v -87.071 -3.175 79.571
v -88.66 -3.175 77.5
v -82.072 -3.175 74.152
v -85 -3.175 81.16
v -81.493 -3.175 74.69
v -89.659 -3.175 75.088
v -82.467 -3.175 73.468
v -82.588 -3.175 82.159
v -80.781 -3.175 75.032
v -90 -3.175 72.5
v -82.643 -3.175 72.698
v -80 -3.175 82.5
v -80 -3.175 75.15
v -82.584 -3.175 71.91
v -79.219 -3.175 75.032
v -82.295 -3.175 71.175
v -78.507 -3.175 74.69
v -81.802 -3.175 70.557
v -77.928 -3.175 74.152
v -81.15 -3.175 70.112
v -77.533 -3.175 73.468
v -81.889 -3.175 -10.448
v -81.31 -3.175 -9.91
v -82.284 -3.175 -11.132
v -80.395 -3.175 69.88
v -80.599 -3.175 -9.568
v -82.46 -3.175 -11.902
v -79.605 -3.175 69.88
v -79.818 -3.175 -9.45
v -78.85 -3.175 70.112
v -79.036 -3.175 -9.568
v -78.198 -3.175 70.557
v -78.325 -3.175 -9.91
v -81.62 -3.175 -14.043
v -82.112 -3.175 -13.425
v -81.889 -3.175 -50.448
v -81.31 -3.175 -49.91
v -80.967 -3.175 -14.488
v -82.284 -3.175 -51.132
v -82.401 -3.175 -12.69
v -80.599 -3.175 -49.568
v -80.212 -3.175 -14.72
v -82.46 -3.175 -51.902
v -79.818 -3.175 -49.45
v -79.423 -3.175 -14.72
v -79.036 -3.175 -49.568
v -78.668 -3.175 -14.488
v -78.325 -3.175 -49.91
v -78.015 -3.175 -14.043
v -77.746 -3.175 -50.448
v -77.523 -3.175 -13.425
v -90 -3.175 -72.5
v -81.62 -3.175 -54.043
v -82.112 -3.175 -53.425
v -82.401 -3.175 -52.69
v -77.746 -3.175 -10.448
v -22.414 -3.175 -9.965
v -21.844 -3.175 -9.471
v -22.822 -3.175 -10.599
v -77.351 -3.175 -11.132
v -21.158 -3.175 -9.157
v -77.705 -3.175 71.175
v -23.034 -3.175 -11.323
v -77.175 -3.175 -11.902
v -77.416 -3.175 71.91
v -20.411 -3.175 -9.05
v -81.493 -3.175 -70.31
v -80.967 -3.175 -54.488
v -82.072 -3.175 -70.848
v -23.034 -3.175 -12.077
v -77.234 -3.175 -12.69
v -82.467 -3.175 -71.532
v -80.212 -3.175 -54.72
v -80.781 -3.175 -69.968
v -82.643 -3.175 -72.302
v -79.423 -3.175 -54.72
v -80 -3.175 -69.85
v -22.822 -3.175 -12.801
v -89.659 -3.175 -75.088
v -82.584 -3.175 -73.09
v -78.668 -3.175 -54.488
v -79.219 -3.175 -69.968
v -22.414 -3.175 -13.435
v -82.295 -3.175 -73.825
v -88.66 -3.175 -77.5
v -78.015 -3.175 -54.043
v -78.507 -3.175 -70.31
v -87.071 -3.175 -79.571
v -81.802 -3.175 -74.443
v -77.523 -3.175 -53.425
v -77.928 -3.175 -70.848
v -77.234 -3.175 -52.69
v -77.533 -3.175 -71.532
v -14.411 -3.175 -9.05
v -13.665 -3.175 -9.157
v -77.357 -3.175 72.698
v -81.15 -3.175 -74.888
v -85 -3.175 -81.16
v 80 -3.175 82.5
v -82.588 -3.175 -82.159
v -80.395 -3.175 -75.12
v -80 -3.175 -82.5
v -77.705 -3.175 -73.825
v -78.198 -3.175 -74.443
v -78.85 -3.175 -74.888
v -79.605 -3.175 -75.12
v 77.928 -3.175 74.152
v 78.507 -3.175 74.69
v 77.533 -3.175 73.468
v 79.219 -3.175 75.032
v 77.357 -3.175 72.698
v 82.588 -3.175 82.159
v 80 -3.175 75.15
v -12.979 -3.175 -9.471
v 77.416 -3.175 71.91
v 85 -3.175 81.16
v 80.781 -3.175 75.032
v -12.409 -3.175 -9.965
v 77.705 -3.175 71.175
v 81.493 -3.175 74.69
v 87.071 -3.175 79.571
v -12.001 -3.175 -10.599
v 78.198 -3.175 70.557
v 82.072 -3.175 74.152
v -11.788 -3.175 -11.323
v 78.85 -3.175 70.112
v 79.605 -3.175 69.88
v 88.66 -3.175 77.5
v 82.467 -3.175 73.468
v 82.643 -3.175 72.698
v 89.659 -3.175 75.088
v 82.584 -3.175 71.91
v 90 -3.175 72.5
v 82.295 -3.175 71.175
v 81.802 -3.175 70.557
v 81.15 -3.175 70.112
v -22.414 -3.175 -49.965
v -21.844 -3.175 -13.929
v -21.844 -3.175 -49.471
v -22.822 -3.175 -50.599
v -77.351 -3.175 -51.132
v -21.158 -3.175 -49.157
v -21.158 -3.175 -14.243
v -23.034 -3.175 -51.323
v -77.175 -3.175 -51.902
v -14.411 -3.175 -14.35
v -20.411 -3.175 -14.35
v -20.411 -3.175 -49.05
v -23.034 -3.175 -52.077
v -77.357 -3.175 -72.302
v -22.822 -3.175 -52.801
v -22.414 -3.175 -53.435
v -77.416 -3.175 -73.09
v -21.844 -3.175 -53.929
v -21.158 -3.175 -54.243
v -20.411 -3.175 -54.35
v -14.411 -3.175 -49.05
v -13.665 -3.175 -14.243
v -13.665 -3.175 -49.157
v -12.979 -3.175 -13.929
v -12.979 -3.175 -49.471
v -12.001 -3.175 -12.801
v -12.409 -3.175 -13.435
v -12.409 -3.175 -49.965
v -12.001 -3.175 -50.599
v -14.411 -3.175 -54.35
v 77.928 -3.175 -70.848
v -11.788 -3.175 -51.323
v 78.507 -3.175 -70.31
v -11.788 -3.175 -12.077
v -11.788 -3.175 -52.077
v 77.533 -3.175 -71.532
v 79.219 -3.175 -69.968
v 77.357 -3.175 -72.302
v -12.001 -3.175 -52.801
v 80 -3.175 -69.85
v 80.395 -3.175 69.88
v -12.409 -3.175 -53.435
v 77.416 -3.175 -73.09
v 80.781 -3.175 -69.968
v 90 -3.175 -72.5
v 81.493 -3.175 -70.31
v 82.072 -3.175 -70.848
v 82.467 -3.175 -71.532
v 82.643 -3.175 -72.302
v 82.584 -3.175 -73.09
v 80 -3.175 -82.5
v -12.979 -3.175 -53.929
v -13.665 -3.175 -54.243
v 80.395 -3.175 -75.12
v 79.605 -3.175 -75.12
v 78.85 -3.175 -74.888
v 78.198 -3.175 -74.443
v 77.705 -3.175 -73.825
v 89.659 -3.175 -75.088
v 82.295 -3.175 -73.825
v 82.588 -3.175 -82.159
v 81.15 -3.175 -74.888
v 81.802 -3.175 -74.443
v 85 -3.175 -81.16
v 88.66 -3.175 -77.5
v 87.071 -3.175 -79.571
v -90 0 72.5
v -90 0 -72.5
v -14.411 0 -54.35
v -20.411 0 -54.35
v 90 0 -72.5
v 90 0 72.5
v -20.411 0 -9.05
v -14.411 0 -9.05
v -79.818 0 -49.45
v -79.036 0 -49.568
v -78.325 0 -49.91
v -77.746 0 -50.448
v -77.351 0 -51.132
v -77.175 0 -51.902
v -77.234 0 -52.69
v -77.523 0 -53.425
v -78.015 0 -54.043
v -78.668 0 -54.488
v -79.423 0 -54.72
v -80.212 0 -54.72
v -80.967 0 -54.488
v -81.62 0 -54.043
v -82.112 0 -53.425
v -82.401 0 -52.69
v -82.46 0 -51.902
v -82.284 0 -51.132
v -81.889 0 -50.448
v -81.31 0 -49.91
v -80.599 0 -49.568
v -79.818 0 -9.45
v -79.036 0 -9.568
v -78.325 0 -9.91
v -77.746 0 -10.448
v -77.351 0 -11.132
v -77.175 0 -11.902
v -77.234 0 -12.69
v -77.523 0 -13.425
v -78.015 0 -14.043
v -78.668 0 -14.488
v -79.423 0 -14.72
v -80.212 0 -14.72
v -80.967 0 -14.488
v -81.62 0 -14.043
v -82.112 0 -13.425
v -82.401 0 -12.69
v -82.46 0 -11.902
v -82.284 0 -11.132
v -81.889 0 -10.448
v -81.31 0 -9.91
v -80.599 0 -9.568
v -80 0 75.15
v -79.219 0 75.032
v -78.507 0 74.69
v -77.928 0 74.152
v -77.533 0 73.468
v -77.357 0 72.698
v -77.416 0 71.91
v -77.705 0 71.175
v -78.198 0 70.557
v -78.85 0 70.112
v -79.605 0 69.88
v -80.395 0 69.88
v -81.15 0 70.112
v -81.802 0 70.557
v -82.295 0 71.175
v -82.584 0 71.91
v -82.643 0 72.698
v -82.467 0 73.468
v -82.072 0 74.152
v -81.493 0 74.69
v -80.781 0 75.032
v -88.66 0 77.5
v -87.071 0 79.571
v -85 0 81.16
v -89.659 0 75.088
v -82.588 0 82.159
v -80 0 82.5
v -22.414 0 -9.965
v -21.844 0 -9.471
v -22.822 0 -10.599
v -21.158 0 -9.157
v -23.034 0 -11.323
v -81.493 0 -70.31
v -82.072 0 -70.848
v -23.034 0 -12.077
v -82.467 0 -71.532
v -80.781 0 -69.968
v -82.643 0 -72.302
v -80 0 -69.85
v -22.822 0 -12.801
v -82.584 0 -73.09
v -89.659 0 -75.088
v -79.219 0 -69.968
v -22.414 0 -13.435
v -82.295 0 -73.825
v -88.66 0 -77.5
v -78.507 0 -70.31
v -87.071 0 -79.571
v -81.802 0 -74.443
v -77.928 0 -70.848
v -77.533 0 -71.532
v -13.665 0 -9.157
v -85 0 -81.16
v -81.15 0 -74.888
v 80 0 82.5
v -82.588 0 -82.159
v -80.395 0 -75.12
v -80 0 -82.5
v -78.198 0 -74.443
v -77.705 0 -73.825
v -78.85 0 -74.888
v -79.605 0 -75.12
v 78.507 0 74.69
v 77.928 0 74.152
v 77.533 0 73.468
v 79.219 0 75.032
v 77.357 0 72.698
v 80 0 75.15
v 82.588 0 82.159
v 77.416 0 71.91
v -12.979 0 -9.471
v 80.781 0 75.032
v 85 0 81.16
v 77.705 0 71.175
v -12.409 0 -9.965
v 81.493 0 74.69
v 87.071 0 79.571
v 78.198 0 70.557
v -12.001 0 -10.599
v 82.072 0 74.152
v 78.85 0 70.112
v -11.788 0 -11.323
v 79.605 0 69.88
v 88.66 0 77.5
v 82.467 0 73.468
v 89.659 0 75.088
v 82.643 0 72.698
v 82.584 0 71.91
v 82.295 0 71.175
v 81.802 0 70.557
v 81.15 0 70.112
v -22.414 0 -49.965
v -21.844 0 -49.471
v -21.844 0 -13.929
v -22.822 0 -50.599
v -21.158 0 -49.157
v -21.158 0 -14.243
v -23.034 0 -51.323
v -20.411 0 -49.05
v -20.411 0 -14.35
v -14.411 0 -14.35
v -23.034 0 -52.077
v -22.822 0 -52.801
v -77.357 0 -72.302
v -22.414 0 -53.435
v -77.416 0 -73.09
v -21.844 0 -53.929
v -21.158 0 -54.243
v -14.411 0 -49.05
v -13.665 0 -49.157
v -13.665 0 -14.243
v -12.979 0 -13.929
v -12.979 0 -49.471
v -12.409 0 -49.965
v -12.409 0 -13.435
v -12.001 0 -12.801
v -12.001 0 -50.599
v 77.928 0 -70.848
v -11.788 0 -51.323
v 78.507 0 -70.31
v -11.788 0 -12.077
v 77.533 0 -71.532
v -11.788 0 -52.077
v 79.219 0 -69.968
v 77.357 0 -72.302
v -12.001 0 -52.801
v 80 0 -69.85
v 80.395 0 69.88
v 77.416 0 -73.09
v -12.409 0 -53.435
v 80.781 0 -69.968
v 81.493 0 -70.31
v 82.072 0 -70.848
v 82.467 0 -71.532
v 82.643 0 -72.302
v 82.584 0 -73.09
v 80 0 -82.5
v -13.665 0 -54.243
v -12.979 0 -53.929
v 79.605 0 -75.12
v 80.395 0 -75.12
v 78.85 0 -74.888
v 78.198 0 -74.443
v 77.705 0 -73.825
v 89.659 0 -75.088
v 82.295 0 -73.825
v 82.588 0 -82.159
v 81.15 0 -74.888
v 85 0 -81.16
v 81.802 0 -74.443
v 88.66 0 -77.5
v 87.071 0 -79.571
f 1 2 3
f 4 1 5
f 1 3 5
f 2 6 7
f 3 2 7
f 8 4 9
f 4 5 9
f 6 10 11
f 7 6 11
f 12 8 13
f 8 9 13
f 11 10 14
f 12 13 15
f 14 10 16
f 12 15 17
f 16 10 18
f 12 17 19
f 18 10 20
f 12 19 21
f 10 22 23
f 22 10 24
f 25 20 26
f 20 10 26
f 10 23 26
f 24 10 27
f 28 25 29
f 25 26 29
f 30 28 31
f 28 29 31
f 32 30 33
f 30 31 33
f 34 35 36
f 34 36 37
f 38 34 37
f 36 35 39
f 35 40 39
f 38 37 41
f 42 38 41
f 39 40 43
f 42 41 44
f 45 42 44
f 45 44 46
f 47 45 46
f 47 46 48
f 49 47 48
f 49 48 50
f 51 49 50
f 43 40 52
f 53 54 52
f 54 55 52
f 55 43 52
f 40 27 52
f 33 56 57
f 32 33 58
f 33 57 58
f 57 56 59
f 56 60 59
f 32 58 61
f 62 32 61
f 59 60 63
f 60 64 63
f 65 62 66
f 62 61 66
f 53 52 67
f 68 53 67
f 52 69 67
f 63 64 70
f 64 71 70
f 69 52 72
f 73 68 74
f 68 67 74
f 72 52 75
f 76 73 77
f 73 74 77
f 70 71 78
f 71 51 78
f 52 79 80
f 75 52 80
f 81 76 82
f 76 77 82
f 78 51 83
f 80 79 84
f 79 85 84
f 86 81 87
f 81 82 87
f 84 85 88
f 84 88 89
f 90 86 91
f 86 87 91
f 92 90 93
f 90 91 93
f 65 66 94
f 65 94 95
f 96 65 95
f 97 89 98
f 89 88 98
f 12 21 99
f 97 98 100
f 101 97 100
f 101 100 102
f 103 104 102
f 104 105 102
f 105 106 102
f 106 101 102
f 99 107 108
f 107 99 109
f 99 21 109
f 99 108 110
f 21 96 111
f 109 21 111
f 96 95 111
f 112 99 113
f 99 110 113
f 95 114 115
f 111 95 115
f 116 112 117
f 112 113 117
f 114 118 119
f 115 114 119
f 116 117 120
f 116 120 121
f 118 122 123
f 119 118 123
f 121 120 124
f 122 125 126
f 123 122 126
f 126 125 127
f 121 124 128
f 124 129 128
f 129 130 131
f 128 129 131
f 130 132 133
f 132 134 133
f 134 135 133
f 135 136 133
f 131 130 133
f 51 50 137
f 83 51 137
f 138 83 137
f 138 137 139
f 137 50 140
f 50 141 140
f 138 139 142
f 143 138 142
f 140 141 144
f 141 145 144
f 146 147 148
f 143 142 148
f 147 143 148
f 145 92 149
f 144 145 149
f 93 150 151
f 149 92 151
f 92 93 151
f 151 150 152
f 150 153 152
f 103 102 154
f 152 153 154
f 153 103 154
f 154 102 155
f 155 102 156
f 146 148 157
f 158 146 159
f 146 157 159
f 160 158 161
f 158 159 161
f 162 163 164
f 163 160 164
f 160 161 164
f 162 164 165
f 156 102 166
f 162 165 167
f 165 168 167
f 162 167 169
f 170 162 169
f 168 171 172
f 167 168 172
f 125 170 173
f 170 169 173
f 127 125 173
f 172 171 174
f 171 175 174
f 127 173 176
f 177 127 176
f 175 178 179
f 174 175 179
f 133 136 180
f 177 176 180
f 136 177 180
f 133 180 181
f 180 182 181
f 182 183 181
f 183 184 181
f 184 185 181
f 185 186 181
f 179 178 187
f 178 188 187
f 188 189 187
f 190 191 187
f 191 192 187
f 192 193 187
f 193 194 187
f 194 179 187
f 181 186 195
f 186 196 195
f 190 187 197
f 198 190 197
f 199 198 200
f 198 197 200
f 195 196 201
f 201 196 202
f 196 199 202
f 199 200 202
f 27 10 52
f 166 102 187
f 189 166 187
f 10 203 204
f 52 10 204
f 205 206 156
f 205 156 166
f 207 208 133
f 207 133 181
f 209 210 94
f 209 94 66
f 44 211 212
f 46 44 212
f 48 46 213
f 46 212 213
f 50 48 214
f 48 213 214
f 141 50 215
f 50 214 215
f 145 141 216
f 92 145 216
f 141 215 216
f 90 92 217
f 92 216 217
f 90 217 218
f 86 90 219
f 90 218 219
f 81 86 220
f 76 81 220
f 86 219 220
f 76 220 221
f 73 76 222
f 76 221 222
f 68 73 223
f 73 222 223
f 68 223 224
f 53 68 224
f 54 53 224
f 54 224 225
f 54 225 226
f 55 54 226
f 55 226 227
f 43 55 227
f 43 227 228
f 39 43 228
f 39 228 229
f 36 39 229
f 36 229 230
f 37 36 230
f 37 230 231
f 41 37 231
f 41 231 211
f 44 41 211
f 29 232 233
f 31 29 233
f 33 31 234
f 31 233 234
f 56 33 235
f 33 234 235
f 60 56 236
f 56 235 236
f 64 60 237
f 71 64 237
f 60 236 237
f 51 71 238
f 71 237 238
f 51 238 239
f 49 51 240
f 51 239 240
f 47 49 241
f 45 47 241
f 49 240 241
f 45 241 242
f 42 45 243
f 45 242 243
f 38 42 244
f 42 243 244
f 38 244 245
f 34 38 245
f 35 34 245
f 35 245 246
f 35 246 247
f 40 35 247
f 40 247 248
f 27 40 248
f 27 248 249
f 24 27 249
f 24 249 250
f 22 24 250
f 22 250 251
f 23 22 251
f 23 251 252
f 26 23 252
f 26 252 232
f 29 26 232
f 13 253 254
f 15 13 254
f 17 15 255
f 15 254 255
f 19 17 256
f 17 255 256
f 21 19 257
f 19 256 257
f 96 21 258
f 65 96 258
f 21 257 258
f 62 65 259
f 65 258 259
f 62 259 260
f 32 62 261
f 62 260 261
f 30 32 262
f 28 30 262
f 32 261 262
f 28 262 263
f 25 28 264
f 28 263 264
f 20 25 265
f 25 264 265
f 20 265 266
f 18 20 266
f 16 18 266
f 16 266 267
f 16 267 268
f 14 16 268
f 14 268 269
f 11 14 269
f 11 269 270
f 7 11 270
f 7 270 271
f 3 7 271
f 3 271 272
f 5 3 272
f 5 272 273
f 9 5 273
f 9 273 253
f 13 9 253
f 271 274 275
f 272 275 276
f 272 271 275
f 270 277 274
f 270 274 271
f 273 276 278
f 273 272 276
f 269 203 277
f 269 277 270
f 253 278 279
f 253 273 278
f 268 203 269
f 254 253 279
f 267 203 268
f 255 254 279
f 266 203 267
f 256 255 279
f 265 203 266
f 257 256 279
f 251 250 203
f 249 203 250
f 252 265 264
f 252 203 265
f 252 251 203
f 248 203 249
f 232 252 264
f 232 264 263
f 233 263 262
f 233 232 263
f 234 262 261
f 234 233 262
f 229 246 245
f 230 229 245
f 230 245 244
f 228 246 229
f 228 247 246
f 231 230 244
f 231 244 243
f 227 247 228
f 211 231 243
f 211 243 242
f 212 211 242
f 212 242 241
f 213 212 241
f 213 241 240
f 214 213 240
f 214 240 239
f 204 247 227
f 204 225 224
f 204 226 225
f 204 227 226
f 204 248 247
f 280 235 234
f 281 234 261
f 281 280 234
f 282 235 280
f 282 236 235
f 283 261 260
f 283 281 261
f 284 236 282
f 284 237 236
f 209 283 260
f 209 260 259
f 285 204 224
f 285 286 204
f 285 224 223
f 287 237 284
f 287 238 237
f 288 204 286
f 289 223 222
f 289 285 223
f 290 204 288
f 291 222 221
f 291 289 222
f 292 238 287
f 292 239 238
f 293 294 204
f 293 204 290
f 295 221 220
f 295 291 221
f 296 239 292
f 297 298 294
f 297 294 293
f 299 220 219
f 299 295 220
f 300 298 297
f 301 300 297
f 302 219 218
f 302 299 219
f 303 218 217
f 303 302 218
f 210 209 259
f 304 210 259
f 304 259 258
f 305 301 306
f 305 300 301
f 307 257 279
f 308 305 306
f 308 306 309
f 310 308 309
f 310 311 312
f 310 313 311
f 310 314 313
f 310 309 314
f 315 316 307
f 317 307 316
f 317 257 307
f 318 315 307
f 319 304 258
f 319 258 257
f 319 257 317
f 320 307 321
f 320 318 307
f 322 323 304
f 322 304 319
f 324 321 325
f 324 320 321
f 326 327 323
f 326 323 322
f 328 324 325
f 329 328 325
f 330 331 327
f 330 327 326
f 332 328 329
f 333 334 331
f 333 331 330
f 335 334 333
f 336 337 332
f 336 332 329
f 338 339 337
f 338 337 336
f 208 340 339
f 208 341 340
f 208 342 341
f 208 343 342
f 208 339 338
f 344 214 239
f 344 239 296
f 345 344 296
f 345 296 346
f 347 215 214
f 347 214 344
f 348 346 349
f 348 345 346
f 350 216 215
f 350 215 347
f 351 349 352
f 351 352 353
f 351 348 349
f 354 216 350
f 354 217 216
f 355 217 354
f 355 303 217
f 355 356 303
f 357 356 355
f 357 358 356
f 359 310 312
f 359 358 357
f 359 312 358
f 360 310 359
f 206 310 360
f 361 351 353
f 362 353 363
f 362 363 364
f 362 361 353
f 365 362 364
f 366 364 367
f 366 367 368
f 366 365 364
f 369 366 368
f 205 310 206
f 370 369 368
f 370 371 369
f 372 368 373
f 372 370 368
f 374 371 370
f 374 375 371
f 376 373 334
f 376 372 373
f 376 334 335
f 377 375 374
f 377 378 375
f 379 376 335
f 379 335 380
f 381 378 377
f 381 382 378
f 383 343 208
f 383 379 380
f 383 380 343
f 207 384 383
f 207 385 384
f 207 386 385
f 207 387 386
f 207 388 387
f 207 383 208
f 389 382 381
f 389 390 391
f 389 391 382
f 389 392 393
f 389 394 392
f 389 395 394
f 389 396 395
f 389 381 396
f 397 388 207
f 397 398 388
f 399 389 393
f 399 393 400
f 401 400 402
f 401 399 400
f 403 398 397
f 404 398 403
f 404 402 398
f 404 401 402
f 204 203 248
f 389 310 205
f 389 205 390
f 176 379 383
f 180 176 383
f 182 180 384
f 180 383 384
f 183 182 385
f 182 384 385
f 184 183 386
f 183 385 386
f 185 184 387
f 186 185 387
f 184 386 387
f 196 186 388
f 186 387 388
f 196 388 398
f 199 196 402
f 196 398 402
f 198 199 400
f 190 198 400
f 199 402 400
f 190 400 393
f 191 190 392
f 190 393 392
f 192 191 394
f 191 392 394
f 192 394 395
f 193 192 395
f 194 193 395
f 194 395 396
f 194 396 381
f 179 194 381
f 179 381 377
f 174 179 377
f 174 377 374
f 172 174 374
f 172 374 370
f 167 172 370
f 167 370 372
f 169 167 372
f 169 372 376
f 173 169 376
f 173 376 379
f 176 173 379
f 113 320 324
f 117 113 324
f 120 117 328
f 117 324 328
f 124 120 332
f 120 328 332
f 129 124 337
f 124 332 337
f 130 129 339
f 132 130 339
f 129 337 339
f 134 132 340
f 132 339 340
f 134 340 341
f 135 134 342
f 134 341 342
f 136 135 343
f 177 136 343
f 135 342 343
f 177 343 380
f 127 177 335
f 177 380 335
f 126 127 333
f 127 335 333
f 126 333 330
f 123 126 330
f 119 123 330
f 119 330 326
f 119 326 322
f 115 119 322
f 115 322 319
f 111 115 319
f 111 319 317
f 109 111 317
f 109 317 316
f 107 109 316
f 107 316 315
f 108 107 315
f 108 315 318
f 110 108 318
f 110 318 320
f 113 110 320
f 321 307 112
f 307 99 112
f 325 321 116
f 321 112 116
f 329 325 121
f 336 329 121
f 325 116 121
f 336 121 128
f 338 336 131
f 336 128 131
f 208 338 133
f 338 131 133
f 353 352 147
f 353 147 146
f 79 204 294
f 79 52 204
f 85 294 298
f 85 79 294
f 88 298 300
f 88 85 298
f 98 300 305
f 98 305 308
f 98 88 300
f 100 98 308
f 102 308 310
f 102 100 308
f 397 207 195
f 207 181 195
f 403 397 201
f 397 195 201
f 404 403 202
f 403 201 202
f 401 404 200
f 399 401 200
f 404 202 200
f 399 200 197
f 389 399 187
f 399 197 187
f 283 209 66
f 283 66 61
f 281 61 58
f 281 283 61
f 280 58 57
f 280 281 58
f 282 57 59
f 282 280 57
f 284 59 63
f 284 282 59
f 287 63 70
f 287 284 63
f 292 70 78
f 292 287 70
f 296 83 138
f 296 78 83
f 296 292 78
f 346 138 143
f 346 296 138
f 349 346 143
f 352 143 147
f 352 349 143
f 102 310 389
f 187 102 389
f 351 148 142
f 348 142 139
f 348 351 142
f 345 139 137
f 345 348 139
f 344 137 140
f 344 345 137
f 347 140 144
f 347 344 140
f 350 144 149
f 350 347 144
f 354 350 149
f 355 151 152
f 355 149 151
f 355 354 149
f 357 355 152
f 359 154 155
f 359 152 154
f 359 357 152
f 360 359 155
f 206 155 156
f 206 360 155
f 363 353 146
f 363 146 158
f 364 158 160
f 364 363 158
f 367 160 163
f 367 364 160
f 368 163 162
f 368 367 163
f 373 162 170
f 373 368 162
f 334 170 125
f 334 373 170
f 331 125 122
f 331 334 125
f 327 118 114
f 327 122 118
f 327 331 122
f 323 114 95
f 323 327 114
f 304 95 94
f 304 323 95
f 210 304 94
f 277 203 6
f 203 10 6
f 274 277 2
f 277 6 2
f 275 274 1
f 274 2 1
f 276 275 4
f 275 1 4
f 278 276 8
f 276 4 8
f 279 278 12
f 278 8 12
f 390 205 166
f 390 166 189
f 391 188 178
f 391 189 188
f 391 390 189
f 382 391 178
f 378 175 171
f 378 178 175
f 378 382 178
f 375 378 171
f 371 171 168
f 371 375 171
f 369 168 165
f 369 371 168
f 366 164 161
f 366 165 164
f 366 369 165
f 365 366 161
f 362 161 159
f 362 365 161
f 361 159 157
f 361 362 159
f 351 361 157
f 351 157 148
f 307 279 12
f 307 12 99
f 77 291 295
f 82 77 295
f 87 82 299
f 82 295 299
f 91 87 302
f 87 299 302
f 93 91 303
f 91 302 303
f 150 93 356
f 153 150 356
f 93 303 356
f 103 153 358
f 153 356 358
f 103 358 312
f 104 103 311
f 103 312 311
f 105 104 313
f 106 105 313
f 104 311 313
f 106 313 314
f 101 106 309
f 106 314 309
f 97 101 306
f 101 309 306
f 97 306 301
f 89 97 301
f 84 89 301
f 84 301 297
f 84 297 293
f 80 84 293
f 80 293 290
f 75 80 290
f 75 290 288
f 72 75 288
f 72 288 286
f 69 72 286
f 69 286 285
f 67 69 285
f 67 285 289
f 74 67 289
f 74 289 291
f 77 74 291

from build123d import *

# Parameters (mm, degrees)
SKETCH1_W          = 180
SKETCH1_H          = 165
BASE_FLANGE1_DEPTH = 3.175
FILLET1_R          = 10
SKETCH2_R          = 2.65
CUT_EXTRUDE1_DEPTH = 123.132430685
SKETCH3_R          = 2.65
CUT_EXTRUDE2_DEPTH = 123.132430685


# Sheet-metal steps are written as plain solids
with BuildPart() as part:
    # Sketch1 → Base-Flange1 (new body)
    with BuildSketch(Plane(origin=(0, 0, 0), x_dir=(1, 0, 0), z_dir=(0, 1, 0))):
        Rectangle(SKETCH1_W, SKETCH1_H)
    extrude(amount=-BASE_FLANGE1_DEPTH)

    # Fillet1
    fillet1_edges = [part.edges().sort_by_distance(p)[0] for p in [
        (90, -1.5875, 82.5),
        (-90, -1.5875, 82.5),
        (-90, -1.5875, -82.5),
        (90, -1.5875, -82.5),
    ]]
    fillet(fillet1_edges, radius=FILLET1_R)

    # Sketch2 → Cut-Extrude1 (cut, through all)
    with BuildSketch(Plane(origin=(0, 0, 0), x_dir=(1, 0, 0), z_dir=(0, 1, 0))):
        with Locations(Location((-80, 72.5, 0), (0, 0, 270))):
            Circle(SKETCH2_R)
        with Locations(Location((80, 72.5, 0), (0, 0, 270))):
            Circle(SKETCH2_R)
        with Locations(Location((-80, -72.5, 0), (0, 0, 270))):
            Circle(SKETCH2_R)
        with Locations(Location((80, -72.5, 0), (0, 0, 270))):
            Circle(SKETCH2_R)
    extrude(amount=-CUT_EXTRUDE1_DEPTH, mode=Mode.SUBTRACT)

    # Sketch3 → Cut-Extrude2 (cut, through all)
    with BuildSketch(Plane(origin=(0, 0, 0), x_dir=(1, 0, 0), z_dir=(0, 1, 0))):
        with Locations(Location((-79.8175, 52.1, 0), (0, 0, 270))):
            Circle(SKETCH3_R)
        with Locations(Location((-79.8175, 12.1, 0), (0, 0, 270))):
            Circle(SKETCH3_R)
        with BuildLine():
            Line((-20.41125, 54.35), (-14.41125, 54.35))
            ThreePointArc((-14.41125, 54.35), (-11.76125, 51.7), (-14.41125, 49.05))
            Line((-14.41125, 49.05), (-20.41125, 49.05))
            ThreePointArc((-20.41125, 49.05), (-23.06125, 51.7), (-20.41125, 54.35))
        make_face()
        with BuildLine():
            Line((-20.41125, 14.35), (-14.41125, 14.35))
            ThreePointArc((-14.41125, 14.35), (-11.76125, 11.7), (-14.41125, 9.05))
            Line((-14.41125, 9.05), (-20.41125, 9.05))
            ThreePointArc((-20.41125, 9.05), (-23.06125, 11.7), (-20.41125, 14.35))
        make_face()
    extrude(amount=-CUT_EXTRUDE2_DEPTH, mode=Mode.SUBTRACT)


solid = part.part
